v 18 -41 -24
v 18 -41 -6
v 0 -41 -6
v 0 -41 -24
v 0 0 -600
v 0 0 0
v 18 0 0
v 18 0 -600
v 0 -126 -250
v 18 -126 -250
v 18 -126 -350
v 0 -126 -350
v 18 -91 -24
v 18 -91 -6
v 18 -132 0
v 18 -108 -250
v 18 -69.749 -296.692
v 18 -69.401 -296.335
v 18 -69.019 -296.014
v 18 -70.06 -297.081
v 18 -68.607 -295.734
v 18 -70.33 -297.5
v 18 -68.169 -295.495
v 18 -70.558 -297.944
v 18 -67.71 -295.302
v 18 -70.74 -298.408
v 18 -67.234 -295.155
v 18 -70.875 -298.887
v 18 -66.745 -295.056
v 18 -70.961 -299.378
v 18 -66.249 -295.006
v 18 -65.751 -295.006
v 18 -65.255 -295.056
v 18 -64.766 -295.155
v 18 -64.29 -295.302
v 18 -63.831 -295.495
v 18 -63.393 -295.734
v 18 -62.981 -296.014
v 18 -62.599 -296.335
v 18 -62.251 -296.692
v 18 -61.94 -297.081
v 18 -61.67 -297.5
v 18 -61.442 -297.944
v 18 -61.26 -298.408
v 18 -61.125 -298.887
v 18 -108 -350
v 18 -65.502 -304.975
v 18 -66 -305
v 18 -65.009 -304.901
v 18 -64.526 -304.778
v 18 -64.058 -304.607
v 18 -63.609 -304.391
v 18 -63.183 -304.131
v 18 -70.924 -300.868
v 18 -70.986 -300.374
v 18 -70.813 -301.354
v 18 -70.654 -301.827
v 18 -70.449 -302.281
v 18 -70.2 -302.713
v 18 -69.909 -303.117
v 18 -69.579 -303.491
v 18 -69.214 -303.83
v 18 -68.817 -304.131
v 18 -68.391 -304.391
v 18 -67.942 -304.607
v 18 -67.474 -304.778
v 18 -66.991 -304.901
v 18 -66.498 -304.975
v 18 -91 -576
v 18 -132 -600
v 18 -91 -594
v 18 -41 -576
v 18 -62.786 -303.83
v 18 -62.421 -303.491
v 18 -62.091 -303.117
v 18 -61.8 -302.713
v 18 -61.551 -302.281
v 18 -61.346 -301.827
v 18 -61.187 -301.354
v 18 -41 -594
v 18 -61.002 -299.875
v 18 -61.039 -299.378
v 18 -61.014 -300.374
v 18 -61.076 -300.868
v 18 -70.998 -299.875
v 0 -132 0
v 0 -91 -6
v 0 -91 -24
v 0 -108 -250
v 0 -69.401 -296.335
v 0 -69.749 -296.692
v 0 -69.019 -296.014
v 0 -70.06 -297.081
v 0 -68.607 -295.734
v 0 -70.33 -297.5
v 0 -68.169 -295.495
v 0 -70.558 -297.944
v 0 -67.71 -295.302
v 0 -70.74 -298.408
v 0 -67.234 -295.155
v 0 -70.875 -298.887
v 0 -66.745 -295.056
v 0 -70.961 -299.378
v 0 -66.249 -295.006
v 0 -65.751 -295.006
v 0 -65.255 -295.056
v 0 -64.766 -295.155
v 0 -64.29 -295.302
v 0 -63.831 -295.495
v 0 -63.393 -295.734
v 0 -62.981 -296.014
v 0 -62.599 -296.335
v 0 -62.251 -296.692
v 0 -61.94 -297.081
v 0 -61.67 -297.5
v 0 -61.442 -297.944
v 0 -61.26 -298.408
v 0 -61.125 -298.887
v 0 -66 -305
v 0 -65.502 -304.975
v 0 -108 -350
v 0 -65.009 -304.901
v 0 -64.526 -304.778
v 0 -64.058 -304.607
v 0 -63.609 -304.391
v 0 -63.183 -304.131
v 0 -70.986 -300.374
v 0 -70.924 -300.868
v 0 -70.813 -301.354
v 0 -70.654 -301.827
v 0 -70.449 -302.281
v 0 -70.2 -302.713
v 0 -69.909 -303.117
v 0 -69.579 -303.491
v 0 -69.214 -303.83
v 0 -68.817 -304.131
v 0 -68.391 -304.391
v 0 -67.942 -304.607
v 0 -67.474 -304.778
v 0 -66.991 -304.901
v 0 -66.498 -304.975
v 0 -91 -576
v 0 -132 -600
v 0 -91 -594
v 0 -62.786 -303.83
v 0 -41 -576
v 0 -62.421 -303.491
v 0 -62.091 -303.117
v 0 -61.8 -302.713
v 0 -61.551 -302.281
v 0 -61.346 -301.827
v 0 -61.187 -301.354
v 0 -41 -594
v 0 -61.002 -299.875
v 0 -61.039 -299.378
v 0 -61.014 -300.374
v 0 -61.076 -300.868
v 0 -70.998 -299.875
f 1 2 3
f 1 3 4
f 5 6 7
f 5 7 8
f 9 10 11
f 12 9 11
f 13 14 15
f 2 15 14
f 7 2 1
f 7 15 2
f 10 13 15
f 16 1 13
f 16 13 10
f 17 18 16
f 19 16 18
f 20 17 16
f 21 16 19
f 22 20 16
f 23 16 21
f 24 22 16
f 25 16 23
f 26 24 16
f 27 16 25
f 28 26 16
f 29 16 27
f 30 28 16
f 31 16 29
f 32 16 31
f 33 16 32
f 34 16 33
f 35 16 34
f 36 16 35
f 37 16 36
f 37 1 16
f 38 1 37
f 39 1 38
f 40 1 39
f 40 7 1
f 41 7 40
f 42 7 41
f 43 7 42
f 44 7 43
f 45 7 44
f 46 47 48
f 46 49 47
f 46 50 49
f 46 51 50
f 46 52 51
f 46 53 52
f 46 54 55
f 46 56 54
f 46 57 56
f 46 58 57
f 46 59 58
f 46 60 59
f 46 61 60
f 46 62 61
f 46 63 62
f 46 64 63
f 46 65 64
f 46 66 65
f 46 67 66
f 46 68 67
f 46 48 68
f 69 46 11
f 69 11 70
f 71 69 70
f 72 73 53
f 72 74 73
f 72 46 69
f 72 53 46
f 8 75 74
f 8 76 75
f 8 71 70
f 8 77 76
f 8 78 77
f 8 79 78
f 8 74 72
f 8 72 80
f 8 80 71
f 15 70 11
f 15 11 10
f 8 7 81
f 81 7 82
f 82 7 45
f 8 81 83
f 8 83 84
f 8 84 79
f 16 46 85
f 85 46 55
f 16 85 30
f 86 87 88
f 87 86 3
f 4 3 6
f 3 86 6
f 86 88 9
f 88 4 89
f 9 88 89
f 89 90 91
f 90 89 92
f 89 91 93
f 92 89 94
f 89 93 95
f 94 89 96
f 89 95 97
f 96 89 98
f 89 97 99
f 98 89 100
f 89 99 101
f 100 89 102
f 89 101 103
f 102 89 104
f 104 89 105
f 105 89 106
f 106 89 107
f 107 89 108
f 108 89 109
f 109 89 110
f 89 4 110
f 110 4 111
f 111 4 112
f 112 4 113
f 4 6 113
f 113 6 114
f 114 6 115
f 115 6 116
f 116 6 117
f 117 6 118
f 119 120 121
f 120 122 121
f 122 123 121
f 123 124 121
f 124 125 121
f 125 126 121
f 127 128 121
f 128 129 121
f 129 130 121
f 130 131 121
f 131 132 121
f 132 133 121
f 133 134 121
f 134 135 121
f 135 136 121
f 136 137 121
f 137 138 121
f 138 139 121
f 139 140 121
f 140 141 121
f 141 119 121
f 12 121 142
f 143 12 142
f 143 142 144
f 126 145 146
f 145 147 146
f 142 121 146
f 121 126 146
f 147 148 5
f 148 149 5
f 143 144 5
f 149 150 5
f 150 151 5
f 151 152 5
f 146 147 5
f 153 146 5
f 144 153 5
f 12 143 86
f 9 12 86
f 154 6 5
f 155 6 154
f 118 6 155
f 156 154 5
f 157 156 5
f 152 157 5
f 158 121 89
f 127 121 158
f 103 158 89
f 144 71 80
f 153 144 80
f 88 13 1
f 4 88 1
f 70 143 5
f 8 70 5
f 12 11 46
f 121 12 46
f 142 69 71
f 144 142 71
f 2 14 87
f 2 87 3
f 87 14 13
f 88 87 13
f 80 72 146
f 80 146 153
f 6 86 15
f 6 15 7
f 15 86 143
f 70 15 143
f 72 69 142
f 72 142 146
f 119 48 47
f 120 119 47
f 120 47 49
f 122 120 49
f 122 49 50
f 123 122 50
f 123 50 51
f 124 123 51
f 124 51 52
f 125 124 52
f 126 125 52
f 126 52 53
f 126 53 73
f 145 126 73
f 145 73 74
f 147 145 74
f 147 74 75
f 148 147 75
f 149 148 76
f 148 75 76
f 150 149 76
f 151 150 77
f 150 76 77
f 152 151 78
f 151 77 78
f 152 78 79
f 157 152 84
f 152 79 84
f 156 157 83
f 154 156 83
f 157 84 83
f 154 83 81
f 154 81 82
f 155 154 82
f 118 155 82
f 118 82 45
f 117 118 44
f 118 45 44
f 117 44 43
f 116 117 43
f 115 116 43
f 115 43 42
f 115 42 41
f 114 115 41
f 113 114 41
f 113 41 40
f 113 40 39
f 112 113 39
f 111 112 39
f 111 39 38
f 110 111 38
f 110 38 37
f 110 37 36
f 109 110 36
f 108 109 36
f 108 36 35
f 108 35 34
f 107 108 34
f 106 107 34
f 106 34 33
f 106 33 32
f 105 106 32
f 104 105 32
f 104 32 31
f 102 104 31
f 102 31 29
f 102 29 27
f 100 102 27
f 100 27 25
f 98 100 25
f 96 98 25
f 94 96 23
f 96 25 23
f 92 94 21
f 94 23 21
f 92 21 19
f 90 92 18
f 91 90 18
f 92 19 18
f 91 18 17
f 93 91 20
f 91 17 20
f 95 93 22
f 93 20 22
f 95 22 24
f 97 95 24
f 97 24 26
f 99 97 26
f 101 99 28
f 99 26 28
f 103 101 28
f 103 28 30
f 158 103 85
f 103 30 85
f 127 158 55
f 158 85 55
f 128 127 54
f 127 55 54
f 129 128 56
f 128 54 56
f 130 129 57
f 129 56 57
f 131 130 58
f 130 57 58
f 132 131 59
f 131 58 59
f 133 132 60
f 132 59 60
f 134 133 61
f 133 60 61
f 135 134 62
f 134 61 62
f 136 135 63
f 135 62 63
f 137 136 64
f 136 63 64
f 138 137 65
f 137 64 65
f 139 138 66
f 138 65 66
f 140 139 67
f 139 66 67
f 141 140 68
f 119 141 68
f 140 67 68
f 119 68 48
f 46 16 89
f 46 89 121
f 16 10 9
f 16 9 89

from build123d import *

# Parameters (mm, degrees)
SKETCH1_W           = 600
SKETCH1_H           = 132
BOSS_EXTRUDE1_DEPTH = 18
SKETCH3_R           = 5
CUT_EXTRUDE2_DEPTH  = 584
SKETCH4_W           = 18
SKETCH4_H           = 50
CUT_EXTRUDE4_DEPTH  = 615.612072774
SKETCH5_W           = 100
SKETCH5_H           = 18
CUT_EXTRUDE5_DEPTH  = 615.612072774


with BuildPart() as part:
    # Sketch1 → Boss-Extrude1 (new body)
    with BuildSketch(Plane(origin=(0, 0, 0), x_dir=(0, 0, -1), z_dir=(1, 0, 0))):
        with Locations((300, -66)):
            Rectangle(SKETCH1_W, SKETCH1_H)
    extrude(amount=BOSS_EXTRUDE1_DEPTH)

    # Sketch3 → Cut-Extrude2 (cut)
    with BuildSketch(Plane(origin=(18, 0, 0), x_dir=(0, 0, -1), z_dir=(1, 0, 0))):
        with Locations((300, -66)):
            Circle(SKETCH3_R)
    extrude(amount=-CUT_EXTRUDE2_DEPTH, mode=Mode.SUBTRACT)

    # Sketch4 → Cut-Extrude4 (cut, through all)
    with BuildSketch(Plane(origin=(18, 0, 0), x_dir=(0, 0, -1), z_dir=(1, 0, 0))):
        with Locations((585, -66)):
            Rectangle(SKETCH4_W, SKETCH4_H)
        with Locations((15, -66)):
            Rectangle(SKETCH4_W, SKETCH4_H)
    extrude(amount=-CUT_EXTRUDE4_DEPTH, mode=Mode.SUBTRACT)

    # Sketch5 → Cut-Extrude5 (cut, through all)
    with BuildSketch(Plane(origin=(18, 0, 0), x_dir=(0, 0, -1), z_dir=(1, 0, 0))):
        with Locations((300, -117)):
            Rectangle(SKETCH5_W, SKETCH5_H)
    extrude(amount=-CUT_EXTRUDE5_DEPTH, mode=Mode.SUBTRACT)


solid = part.part
